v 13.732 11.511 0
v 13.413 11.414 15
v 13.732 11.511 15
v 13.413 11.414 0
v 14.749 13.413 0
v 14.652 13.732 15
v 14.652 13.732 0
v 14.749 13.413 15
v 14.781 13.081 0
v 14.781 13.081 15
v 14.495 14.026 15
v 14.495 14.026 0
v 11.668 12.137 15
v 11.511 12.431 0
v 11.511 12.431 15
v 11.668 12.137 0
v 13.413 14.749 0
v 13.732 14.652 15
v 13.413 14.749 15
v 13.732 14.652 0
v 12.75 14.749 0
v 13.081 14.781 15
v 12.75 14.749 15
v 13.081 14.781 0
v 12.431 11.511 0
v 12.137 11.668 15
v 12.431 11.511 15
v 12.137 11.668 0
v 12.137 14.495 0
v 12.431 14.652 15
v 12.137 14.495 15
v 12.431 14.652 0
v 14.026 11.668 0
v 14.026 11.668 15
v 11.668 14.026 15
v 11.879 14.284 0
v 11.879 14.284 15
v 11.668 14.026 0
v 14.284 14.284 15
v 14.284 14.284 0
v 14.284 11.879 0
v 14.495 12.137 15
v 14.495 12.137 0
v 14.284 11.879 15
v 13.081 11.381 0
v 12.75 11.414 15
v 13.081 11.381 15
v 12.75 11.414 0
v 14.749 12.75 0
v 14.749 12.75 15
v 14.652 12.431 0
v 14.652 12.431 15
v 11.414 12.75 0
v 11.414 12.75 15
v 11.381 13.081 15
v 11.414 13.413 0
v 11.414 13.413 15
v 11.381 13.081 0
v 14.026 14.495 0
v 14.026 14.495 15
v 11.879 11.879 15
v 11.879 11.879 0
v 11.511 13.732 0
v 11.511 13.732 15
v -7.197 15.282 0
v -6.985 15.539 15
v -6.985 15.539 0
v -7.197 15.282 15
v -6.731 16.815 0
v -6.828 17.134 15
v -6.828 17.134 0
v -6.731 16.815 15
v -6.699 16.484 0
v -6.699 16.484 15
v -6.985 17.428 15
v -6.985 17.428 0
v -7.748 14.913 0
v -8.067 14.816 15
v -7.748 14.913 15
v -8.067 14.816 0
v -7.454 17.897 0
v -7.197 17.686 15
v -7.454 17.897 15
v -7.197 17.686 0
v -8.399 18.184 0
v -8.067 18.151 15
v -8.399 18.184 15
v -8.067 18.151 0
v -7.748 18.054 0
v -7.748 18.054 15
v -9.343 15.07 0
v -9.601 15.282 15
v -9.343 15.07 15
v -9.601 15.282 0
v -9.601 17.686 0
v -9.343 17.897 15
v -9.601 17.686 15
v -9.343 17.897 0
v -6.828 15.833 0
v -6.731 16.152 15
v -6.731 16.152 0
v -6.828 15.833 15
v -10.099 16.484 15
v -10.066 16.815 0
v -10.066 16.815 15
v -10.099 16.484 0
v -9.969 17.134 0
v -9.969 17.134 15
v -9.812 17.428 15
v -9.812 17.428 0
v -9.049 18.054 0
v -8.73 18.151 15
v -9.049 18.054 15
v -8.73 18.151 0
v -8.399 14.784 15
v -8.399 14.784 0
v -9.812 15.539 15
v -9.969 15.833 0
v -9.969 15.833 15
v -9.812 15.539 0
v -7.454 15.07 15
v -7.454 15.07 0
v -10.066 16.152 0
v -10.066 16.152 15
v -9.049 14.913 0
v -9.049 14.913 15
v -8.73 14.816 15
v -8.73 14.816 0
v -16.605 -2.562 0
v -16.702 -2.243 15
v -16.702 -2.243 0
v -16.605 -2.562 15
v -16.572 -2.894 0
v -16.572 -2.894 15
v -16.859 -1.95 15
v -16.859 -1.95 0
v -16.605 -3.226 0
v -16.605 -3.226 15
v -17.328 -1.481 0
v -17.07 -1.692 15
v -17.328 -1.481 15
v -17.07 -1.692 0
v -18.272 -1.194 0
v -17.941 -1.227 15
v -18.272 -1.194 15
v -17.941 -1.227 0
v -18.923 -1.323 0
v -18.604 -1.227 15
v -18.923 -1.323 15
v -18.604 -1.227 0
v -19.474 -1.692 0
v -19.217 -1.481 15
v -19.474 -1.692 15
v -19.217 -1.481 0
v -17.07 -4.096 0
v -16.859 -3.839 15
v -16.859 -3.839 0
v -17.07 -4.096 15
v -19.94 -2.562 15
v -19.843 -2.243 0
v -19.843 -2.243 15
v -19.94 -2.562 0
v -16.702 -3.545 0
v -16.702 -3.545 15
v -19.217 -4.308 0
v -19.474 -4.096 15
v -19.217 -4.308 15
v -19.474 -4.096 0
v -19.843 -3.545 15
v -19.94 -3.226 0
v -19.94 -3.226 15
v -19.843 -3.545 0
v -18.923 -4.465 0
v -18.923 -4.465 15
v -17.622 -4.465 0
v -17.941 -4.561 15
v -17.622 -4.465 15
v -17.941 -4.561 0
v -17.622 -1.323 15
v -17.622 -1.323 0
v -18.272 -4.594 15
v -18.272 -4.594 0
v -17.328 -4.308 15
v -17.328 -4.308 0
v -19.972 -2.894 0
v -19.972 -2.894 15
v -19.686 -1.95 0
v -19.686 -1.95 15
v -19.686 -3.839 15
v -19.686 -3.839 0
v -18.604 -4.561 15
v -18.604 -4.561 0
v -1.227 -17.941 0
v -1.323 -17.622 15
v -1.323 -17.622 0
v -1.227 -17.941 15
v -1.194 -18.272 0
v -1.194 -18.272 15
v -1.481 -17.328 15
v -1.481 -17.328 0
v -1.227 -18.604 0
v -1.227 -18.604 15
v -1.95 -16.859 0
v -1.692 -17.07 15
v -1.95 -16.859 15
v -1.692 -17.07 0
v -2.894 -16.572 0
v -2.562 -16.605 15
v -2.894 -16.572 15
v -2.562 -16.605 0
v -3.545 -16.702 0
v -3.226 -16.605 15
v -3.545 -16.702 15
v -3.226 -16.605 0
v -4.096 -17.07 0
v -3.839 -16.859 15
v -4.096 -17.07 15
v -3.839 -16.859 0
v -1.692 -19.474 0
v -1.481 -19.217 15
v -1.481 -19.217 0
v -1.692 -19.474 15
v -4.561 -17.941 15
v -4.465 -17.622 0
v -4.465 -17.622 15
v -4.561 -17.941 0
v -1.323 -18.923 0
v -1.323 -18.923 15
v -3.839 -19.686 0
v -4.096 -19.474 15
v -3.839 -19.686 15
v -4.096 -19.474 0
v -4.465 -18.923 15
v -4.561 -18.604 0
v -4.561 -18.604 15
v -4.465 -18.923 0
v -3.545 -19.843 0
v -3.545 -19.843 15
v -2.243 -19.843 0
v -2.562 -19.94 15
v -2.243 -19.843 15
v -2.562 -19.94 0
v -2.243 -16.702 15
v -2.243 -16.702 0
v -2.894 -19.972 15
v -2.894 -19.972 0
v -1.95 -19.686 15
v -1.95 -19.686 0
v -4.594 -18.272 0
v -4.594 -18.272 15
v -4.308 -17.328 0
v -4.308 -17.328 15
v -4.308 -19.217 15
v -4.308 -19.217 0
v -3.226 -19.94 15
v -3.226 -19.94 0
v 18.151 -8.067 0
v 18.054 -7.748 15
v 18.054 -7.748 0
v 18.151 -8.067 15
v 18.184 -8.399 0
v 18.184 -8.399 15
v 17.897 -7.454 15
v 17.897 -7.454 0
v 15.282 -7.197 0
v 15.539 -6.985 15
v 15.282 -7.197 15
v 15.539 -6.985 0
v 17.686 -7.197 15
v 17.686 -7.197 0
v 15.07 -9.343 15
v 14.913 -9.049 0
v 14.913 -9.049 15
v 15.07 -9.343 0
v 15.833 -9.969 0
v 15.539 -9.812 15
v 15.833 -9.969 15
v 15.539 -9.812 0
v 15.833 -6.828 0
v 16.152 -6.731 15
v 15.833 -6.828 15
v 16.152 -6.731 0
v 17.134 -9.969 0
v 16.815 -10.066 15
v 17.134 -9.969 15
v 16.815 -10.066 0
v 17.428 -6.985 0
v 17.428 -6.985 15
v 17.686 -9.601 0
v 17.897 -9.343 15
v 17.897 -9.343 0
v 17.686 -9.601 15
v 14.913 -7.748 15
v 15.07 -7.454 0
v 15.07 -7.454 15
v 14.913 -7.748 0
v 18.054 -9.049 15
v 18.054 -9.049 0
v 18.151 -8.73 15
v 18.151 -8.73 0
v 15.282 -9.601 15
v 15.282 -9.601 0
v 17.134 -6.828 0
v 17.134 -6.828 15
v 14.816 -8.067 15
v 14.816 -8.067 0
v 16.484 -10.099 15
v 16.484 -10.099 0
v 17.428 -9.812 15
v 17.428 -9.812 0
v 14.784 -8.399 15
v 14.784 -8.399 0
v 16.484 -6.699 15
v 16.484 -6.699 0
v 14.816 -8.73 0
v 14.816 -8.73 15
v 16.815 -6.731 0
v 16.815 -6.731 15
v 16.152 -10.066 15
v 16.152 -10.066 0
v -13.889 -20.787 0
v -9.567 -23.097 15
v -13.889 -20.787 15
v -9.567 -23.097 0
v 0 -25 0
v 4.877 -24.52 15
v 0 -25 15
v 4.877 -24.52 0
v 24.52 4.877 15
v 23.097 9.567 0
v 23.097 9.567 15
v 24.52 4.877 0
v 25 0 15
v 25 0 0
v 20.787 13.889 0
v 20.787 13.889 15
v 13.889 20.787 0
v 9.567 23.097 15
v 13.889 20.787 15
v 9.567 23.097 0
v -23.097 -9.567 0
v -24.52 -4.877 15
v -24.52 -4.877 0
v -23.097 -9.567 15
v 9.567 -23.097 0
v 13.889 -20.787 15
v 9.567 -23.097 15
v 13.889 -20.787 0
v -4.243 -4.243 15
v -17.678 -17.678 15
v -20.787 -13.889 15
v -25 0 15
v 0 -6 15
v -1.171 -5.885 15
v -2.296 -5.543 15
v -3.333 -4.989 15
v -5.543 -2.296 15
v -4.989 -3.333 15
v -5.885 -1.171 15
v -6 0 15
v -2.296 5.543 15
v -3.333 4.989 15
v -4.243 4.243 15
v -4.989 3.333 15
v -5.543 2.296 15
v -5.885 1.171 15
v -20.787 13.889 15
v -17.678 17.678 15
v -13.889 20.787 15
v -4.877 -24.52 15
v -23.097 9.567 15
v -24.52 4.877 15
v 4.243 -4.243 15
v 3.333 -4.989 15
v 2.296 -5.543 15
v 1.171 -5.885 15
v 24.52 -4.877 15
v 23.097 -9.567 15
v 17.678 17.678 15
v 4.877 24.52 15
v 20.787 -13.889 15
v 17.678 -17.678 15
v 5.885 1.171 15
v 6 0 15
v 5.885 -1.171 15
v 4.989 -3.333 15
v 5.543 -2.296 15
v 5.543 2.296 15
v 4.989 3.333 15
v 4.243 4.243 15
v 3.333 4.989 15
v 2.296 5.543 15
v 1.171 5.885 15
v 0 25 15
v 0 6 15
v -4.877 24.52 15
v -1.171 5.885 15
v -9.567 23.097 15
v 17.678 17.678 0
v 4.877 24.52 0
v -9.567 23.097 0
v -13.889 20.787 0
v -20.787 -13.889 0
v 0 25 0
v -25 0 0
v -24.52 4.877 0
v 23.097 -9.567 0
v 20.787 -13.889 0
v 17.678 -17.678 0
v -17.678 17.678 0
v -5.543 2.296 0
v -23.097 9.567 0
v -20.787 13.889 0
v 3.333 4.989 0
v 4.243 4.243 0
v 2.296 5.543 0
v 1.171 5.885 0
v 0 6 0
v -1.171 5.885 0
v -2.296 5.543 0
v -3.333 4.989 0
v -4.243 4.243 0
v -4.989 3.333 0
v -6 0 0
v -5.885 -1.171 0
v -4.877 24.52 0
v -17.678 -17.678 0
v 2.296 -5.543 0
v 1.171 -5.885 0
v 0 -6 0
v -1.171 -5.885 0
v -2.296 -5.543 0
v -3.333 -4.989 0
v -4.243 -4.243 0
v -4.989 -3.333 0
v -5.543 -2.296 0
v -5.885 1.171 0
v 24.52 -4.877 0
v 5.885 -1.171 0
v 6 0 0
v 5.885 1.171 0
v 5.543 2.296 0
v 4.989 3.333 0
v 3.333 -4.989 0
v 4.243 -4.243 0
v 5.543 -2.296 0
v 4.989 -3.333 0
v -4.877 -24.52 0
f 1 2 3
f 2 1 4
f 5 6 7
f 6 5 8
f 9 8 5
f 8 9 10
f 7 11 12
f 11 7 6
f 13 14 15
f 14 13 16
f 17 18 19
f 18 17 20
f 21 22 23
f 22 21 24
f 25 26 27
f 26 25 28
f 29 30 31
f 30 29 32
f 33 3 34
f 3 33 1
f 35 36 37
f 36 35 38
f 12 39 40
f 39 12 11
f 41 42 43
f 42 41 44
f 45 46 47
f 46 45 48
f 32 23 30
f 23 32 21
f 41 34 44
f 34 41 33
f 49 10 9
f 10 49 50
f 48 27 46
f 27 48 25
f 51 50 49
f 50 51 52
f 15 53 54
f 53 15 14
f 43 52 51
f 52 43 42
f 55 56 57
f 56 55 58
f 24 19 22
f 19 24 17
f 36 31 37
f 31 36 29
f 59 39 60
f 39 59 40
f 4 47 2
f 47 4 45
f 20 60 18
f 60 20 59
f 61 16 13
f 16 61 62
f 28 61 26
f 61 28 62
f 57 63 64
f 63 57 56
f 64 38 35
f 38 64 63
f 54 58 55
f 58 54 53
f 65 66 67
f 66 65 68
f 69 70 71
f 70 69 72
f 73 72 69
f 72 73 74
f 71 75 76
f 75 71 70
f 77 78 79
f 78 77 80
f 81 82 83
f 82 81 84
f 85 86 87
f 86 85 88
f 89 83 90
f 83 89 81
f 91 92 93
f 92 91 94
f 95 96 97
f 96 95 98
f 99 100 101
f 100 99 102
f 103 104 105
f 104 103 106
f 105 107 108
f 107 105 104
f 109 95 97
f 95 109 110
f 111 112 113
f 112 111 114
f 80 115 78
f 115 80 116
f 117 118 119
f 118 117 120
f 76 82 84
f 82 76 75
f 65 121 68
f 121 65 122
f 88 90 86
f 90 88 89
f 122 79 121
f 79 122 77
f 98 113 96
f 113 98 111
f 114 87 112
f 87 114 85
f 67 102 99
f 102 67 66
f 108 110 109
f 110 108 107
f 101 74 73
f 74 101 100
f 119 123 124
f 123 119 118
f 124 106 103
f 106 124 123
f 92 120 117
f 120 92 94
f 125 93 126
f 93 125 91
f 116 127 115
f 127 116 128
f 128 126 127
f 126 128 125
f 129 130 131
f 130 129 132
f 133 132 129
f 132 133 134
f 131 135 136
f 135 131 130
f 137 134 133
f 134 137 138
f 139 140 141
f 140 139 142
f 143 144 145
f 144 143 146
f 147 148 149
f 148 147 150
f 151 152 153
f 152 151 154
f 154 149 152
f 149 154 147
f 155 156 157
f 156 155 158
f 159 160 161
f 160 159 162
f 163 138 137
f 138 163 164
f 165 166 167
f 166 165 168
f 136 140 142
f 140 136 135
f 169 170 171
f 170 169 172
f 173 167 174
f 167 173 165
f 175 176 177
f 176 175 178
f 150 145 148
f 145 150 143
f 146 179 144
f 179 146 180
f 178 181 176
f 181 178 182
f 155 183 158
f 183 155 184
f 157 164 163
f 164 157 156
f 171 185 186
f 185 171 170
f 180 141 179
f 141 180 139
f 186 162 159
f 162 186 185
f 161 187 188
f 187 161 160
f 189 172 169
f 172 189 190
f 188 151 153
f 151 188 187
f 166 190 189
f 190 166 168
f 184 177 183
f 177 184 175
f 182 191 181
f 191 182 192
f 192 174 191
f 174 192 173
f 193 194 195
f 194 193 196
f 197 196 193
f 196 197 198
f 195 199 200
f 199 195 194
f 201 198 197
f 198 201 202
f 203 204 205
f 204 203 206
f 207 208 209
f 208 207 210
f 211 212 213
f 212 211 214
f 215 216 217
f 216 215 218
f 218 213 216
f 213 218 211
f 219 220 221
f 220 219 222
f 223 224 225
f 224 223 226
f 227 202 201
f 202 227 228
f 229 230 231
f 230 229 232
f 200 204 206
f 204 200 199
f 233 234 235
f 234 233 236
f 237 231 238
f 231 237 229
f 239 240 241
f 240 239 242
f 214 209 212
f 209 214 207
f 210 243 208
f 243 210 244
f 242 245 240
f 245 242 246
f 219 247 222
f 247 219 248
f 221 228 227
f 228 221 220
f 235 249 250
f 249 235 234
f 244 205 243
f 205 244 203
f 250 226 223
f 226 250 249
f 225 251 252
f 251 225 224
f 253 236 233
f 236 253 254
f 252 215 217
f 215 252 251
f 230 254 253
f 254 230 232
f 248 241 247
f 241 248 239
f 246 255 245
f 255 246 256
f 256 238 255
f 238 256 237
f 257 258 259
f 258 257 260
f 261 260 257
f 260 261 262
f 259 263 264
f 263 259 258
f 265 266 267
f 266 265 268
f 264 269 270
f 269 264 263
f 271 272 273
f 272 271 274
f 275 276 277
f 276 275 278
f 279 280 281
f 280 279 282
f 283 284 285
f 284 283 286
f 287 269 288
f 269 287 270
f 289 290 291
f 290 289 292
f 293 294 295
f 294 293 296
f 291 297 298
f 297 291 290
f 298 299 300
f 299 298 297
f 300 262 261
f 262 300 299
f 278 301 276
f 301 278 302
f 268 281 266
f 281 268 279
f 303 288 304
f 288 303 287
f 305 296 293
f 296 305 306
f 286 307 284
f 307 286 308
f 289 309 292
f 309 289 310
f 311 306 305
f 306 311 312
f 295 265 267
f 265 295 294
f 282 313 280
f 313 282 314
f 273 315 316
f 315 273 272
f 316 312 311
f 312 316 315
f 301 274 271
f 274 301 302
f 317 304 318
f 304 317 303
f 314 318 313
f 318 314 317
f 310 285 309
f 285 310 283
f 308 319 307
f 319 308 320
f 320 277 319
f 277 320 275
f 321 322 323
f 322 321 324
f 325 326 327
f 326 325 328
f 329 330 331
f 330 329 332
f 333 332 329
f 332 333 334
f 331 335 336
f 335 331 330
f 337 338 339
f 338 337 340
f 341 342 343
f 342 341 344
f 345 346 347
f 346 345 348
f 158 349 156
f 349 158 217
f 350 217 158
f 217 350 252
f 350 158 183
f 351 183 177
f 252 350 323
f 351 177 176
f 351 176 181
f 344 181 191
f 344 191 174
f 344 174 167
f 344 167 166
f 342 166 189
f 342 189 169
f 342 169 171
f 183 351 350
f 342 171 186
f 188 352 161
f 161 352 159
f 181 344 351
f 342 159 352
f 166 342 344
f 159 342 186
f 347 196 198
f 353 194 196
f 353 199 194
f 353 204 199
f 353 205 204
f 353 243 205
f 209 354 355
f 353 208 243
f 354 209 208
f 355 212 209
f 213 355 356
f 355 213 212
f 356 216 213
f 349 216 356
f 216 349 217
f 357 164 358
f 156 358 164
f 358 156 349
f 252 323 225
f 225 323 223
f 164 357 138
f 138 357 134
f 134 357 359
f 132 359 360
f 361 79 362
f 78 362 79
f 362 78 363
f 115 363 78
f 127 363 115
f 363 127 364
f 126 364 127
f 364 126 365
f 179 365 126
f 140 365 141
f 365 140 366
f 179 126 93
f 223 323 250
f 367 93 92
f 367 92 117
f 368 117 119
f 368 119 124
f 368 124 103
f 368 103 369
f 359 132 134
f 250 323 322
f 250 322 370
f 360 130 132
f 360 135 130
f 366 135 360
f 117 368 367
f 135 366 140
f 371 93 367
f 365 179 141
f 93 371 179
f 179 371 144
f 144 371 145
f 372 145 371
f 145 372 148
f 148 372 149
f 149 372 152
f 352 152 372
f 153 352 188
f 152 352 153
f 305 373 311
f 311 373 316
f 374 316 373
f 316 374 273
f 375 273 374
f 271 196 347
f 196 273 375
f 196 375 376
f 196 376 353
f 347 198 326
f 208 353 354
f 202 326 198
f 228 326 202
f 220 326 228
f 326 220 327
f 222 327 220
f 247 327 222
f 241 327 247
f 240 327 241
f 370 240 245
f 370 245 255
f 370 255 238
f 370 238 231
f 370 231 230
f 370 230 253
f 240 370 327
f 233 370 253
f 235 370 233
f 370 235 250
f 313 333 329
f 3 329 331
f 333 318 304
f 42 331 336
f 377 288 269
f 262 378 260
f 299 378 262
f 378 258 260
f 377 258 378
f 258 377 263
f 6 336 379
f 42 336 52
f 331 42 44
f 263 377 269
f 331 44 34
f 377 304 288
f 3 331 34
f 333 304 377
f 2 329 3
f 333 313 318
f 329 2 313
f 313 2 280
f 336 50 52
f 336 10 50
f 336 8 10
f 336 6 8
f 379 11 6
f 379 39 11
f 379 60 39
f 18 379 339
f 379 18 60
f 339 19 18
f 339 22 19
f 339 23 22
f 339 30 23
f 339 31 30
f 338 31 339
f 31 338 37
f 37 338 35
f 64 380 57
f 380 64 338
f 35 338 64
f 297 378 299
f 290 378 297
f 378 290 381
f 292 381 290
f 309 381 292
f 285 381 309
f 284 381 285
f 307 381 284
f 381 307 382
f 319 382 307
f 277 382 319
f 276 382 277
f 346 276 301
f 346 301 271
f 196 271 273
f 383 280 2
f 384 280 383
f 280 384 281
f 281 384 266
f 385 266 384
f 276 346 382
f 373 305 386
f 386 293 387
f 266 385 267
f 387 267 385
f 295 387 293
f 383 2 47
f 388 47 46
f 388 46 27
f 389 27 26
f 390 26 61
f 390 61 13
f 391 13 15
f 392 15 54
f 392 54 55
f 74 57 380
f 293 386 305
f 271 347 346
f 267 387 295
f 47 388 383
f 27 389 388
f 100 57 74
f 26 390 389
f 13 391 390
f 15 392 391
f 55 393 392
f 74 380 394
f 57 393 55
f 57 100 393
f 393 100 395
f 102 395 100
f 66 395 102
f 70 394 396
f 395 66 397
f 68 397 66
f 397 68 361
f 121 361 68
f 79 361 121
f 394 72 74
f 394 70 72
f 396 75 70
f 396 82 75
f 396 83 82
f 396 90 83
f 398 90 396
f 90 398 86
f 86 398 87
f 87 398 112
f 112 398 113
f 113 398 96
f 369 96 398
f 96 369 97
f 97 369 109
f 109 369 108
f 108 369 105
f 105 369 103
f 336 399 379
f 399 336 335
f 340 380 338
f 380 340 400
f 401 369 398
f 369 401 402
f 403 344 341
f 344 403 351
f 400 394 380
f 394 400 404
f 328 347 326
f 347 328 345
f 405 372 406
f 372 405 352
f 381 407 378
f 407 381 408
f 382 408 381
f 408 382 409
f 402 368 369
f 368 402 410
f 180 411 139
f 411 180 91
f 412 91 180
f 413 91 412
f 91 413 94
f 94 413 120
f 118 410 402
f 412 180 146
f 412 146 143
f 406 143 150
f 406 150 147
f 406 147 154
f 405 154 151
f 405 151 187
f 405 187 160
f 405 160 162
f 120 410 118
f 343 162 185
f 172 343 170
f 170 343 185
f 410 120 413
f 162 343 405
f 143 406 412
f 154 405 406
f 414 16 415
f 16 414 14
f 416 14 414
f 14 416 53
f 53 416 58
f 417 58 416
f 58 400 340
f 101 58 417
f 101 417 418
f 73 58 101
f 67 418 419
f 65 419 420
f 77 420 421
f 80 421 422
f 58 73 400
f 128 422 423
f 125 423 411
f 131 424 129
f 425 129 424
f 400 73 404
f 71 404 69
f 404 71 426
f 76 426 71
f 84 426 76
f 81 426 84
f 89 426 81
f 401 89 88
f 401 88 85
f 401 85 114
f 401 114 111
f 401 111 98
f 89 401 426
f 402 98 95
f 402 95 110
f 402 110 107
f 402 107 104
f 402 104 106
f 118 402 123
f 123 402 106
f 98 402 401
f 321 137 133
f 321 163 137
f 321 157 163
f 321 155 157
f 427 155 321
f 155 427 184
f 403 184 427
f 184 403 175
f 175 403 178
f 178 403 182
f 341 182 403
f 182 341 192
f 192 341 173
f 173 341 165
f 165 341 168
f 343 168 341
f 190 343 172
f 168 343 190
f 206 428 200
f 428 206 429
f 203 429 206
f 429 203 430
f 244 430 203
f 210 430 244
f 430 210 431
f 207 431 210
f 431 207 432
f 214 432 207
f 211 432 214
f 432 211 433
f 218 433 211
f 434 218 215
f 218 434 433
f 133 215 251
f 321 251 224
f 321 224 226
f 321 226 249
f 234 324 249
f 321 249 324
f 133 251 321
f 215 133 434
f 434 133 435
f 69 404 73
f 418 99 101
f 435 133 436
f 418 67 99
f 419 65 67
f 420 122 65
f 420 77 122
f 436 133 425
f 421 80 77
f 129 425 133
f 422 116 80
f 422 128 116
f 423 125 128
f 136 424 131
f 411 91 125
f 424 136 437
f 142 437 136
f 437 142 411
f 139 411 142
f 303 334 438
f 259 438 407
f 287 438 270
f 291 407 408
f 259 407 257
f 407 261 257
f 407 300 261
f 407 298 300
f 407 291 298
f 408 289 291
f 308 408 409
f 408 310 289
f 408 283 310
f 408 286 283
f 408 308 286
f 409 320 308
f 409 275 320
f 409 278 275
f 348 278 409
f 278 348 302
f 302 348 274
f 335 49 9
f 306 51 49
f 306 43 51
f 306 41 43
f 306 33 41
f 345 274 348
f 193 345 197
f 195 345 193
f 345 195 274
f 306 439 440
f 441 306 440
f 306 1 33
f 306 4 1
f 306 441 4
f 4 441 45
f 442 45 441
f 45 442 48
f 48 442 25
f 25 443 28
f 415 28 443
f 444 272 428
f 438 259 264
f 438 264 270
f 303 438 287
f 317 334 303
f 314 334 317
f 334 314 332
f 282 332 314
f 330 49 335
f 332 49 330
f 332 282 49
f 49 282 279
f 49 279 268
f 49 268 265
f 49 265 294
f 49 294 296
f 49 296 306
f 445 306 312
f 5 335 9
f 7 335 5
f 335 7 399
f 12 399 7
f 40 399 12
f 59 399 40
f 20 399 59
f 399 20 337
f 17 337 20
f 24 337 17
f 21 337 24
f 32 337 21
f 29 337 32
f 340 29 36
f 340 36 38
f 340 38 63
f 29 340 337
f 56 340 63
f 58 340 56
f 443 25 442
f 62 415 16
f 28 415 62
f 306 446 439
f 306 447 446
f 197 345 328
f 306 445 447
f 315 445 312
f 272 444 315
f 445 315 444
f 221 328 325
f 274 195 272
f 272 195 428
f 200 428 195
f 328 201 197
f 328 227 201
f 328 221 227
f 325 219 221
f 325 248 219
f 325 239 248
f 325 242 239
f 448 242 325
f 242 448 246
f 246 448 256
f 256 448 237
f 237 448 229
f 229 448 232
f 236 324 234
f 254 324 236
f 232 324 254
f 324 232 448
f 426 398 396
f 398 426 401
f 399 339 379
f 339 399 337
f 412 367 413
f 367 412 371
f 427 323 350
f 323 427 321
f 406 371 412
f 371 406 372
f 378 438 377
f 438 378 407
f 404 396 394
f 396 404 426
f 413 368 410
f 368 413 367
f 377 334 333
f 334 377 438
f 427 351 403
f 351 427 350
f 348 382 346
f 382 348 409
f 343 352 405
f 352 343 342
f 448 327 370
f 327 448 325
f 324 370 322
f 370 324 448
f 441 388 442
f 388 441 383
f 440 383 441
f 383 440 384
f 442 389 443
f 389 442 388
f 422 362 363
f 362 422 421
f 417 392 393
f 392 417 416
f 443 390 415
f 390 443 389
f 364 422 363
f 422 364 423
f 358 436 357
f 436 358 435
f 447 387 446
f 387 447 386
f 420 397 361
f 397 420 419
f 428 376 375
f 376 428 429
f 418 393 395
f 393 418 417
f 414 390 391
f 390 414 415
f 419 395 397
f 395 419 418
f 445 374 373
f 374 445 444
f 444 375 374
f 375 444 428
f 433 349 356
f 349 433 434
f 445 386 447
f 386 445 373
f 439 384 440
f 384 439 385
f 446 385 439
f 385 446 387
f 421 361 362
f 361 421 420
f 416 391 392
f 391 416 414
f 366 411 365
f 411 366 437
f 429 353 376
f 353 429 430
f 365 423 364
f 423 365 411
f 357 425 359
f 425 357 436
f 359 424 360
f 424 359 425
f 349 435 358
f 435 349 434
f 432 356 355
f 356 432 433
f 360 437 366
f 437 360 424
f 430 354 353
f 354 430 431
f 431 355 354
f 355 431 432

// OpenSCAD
$fn = 32;

// ----------------------------------------------------------------------
// Flange Ø50 x 15
// 5 holes on a Ø37 bolt circle, bolted joints
// ----------------------------------------------------------------------

// --- parameters (mm) ---
flange_d = 50;   // outside diameter of the flange
thickness = 15;  // flange thickness
holes = 5;       // number of bolt holes
pcd = 37;        // bolt circle diameter
start_deg = 45;  // angle of the first hole, from +X
hole_d = 3.4;    // bolt hole diameter
bore_d = 12;     // central through bore
hub_d = 24;      // hub outside diameter
hub_h = 0;       // hub height above the flange face (0 = no hub)

// --- derived feature positions (mm) ---
height = thickness + hub_h;  // = 15   overall height of the part
pcd_r = pcd / 2;             // = 18.5   bolt circle radius
hole_step = 360 / holes;     // = 72   angular pitch
feature_centers = [
  [pcd_r * cos(start_deg + 0 * hole_step), pcd_r * sin(start_deg + 0 * hole_step)],
  [pcd_r * cos(start_deg + 1 * hole_step), pcd_r * sin(start_deg + 1 * hole_step)],
  [pcd_r * cos(start_deg + 2 * hole_step), pcd_r * sin(start_deg + 2 * hole_step)],
  [pcd_r * cos(start_deg + 3 * hole_step), pcd_r * sin(start_deg + 3 * hole_step)],
  [pcd_r * cos(start_deg + 4 * hole_step), pcd_r * sin(start_deg + 4 * hole_step)]
];   // bolt hole centres on the pitch circle

// flange disc, every hole and the bore cut straight through
difference() {
  union() {
    cylinder(d = flange_d, h = thickness);
  }
  translate([0, 0, -1]) cylinder(d = bore_d, h = height + 2);  // bore, through
  for (centre = feature_centers)
    translate([centre[0], centre[1], -1]) cylinder(d = hole_d, h = thickness + 2);
}
